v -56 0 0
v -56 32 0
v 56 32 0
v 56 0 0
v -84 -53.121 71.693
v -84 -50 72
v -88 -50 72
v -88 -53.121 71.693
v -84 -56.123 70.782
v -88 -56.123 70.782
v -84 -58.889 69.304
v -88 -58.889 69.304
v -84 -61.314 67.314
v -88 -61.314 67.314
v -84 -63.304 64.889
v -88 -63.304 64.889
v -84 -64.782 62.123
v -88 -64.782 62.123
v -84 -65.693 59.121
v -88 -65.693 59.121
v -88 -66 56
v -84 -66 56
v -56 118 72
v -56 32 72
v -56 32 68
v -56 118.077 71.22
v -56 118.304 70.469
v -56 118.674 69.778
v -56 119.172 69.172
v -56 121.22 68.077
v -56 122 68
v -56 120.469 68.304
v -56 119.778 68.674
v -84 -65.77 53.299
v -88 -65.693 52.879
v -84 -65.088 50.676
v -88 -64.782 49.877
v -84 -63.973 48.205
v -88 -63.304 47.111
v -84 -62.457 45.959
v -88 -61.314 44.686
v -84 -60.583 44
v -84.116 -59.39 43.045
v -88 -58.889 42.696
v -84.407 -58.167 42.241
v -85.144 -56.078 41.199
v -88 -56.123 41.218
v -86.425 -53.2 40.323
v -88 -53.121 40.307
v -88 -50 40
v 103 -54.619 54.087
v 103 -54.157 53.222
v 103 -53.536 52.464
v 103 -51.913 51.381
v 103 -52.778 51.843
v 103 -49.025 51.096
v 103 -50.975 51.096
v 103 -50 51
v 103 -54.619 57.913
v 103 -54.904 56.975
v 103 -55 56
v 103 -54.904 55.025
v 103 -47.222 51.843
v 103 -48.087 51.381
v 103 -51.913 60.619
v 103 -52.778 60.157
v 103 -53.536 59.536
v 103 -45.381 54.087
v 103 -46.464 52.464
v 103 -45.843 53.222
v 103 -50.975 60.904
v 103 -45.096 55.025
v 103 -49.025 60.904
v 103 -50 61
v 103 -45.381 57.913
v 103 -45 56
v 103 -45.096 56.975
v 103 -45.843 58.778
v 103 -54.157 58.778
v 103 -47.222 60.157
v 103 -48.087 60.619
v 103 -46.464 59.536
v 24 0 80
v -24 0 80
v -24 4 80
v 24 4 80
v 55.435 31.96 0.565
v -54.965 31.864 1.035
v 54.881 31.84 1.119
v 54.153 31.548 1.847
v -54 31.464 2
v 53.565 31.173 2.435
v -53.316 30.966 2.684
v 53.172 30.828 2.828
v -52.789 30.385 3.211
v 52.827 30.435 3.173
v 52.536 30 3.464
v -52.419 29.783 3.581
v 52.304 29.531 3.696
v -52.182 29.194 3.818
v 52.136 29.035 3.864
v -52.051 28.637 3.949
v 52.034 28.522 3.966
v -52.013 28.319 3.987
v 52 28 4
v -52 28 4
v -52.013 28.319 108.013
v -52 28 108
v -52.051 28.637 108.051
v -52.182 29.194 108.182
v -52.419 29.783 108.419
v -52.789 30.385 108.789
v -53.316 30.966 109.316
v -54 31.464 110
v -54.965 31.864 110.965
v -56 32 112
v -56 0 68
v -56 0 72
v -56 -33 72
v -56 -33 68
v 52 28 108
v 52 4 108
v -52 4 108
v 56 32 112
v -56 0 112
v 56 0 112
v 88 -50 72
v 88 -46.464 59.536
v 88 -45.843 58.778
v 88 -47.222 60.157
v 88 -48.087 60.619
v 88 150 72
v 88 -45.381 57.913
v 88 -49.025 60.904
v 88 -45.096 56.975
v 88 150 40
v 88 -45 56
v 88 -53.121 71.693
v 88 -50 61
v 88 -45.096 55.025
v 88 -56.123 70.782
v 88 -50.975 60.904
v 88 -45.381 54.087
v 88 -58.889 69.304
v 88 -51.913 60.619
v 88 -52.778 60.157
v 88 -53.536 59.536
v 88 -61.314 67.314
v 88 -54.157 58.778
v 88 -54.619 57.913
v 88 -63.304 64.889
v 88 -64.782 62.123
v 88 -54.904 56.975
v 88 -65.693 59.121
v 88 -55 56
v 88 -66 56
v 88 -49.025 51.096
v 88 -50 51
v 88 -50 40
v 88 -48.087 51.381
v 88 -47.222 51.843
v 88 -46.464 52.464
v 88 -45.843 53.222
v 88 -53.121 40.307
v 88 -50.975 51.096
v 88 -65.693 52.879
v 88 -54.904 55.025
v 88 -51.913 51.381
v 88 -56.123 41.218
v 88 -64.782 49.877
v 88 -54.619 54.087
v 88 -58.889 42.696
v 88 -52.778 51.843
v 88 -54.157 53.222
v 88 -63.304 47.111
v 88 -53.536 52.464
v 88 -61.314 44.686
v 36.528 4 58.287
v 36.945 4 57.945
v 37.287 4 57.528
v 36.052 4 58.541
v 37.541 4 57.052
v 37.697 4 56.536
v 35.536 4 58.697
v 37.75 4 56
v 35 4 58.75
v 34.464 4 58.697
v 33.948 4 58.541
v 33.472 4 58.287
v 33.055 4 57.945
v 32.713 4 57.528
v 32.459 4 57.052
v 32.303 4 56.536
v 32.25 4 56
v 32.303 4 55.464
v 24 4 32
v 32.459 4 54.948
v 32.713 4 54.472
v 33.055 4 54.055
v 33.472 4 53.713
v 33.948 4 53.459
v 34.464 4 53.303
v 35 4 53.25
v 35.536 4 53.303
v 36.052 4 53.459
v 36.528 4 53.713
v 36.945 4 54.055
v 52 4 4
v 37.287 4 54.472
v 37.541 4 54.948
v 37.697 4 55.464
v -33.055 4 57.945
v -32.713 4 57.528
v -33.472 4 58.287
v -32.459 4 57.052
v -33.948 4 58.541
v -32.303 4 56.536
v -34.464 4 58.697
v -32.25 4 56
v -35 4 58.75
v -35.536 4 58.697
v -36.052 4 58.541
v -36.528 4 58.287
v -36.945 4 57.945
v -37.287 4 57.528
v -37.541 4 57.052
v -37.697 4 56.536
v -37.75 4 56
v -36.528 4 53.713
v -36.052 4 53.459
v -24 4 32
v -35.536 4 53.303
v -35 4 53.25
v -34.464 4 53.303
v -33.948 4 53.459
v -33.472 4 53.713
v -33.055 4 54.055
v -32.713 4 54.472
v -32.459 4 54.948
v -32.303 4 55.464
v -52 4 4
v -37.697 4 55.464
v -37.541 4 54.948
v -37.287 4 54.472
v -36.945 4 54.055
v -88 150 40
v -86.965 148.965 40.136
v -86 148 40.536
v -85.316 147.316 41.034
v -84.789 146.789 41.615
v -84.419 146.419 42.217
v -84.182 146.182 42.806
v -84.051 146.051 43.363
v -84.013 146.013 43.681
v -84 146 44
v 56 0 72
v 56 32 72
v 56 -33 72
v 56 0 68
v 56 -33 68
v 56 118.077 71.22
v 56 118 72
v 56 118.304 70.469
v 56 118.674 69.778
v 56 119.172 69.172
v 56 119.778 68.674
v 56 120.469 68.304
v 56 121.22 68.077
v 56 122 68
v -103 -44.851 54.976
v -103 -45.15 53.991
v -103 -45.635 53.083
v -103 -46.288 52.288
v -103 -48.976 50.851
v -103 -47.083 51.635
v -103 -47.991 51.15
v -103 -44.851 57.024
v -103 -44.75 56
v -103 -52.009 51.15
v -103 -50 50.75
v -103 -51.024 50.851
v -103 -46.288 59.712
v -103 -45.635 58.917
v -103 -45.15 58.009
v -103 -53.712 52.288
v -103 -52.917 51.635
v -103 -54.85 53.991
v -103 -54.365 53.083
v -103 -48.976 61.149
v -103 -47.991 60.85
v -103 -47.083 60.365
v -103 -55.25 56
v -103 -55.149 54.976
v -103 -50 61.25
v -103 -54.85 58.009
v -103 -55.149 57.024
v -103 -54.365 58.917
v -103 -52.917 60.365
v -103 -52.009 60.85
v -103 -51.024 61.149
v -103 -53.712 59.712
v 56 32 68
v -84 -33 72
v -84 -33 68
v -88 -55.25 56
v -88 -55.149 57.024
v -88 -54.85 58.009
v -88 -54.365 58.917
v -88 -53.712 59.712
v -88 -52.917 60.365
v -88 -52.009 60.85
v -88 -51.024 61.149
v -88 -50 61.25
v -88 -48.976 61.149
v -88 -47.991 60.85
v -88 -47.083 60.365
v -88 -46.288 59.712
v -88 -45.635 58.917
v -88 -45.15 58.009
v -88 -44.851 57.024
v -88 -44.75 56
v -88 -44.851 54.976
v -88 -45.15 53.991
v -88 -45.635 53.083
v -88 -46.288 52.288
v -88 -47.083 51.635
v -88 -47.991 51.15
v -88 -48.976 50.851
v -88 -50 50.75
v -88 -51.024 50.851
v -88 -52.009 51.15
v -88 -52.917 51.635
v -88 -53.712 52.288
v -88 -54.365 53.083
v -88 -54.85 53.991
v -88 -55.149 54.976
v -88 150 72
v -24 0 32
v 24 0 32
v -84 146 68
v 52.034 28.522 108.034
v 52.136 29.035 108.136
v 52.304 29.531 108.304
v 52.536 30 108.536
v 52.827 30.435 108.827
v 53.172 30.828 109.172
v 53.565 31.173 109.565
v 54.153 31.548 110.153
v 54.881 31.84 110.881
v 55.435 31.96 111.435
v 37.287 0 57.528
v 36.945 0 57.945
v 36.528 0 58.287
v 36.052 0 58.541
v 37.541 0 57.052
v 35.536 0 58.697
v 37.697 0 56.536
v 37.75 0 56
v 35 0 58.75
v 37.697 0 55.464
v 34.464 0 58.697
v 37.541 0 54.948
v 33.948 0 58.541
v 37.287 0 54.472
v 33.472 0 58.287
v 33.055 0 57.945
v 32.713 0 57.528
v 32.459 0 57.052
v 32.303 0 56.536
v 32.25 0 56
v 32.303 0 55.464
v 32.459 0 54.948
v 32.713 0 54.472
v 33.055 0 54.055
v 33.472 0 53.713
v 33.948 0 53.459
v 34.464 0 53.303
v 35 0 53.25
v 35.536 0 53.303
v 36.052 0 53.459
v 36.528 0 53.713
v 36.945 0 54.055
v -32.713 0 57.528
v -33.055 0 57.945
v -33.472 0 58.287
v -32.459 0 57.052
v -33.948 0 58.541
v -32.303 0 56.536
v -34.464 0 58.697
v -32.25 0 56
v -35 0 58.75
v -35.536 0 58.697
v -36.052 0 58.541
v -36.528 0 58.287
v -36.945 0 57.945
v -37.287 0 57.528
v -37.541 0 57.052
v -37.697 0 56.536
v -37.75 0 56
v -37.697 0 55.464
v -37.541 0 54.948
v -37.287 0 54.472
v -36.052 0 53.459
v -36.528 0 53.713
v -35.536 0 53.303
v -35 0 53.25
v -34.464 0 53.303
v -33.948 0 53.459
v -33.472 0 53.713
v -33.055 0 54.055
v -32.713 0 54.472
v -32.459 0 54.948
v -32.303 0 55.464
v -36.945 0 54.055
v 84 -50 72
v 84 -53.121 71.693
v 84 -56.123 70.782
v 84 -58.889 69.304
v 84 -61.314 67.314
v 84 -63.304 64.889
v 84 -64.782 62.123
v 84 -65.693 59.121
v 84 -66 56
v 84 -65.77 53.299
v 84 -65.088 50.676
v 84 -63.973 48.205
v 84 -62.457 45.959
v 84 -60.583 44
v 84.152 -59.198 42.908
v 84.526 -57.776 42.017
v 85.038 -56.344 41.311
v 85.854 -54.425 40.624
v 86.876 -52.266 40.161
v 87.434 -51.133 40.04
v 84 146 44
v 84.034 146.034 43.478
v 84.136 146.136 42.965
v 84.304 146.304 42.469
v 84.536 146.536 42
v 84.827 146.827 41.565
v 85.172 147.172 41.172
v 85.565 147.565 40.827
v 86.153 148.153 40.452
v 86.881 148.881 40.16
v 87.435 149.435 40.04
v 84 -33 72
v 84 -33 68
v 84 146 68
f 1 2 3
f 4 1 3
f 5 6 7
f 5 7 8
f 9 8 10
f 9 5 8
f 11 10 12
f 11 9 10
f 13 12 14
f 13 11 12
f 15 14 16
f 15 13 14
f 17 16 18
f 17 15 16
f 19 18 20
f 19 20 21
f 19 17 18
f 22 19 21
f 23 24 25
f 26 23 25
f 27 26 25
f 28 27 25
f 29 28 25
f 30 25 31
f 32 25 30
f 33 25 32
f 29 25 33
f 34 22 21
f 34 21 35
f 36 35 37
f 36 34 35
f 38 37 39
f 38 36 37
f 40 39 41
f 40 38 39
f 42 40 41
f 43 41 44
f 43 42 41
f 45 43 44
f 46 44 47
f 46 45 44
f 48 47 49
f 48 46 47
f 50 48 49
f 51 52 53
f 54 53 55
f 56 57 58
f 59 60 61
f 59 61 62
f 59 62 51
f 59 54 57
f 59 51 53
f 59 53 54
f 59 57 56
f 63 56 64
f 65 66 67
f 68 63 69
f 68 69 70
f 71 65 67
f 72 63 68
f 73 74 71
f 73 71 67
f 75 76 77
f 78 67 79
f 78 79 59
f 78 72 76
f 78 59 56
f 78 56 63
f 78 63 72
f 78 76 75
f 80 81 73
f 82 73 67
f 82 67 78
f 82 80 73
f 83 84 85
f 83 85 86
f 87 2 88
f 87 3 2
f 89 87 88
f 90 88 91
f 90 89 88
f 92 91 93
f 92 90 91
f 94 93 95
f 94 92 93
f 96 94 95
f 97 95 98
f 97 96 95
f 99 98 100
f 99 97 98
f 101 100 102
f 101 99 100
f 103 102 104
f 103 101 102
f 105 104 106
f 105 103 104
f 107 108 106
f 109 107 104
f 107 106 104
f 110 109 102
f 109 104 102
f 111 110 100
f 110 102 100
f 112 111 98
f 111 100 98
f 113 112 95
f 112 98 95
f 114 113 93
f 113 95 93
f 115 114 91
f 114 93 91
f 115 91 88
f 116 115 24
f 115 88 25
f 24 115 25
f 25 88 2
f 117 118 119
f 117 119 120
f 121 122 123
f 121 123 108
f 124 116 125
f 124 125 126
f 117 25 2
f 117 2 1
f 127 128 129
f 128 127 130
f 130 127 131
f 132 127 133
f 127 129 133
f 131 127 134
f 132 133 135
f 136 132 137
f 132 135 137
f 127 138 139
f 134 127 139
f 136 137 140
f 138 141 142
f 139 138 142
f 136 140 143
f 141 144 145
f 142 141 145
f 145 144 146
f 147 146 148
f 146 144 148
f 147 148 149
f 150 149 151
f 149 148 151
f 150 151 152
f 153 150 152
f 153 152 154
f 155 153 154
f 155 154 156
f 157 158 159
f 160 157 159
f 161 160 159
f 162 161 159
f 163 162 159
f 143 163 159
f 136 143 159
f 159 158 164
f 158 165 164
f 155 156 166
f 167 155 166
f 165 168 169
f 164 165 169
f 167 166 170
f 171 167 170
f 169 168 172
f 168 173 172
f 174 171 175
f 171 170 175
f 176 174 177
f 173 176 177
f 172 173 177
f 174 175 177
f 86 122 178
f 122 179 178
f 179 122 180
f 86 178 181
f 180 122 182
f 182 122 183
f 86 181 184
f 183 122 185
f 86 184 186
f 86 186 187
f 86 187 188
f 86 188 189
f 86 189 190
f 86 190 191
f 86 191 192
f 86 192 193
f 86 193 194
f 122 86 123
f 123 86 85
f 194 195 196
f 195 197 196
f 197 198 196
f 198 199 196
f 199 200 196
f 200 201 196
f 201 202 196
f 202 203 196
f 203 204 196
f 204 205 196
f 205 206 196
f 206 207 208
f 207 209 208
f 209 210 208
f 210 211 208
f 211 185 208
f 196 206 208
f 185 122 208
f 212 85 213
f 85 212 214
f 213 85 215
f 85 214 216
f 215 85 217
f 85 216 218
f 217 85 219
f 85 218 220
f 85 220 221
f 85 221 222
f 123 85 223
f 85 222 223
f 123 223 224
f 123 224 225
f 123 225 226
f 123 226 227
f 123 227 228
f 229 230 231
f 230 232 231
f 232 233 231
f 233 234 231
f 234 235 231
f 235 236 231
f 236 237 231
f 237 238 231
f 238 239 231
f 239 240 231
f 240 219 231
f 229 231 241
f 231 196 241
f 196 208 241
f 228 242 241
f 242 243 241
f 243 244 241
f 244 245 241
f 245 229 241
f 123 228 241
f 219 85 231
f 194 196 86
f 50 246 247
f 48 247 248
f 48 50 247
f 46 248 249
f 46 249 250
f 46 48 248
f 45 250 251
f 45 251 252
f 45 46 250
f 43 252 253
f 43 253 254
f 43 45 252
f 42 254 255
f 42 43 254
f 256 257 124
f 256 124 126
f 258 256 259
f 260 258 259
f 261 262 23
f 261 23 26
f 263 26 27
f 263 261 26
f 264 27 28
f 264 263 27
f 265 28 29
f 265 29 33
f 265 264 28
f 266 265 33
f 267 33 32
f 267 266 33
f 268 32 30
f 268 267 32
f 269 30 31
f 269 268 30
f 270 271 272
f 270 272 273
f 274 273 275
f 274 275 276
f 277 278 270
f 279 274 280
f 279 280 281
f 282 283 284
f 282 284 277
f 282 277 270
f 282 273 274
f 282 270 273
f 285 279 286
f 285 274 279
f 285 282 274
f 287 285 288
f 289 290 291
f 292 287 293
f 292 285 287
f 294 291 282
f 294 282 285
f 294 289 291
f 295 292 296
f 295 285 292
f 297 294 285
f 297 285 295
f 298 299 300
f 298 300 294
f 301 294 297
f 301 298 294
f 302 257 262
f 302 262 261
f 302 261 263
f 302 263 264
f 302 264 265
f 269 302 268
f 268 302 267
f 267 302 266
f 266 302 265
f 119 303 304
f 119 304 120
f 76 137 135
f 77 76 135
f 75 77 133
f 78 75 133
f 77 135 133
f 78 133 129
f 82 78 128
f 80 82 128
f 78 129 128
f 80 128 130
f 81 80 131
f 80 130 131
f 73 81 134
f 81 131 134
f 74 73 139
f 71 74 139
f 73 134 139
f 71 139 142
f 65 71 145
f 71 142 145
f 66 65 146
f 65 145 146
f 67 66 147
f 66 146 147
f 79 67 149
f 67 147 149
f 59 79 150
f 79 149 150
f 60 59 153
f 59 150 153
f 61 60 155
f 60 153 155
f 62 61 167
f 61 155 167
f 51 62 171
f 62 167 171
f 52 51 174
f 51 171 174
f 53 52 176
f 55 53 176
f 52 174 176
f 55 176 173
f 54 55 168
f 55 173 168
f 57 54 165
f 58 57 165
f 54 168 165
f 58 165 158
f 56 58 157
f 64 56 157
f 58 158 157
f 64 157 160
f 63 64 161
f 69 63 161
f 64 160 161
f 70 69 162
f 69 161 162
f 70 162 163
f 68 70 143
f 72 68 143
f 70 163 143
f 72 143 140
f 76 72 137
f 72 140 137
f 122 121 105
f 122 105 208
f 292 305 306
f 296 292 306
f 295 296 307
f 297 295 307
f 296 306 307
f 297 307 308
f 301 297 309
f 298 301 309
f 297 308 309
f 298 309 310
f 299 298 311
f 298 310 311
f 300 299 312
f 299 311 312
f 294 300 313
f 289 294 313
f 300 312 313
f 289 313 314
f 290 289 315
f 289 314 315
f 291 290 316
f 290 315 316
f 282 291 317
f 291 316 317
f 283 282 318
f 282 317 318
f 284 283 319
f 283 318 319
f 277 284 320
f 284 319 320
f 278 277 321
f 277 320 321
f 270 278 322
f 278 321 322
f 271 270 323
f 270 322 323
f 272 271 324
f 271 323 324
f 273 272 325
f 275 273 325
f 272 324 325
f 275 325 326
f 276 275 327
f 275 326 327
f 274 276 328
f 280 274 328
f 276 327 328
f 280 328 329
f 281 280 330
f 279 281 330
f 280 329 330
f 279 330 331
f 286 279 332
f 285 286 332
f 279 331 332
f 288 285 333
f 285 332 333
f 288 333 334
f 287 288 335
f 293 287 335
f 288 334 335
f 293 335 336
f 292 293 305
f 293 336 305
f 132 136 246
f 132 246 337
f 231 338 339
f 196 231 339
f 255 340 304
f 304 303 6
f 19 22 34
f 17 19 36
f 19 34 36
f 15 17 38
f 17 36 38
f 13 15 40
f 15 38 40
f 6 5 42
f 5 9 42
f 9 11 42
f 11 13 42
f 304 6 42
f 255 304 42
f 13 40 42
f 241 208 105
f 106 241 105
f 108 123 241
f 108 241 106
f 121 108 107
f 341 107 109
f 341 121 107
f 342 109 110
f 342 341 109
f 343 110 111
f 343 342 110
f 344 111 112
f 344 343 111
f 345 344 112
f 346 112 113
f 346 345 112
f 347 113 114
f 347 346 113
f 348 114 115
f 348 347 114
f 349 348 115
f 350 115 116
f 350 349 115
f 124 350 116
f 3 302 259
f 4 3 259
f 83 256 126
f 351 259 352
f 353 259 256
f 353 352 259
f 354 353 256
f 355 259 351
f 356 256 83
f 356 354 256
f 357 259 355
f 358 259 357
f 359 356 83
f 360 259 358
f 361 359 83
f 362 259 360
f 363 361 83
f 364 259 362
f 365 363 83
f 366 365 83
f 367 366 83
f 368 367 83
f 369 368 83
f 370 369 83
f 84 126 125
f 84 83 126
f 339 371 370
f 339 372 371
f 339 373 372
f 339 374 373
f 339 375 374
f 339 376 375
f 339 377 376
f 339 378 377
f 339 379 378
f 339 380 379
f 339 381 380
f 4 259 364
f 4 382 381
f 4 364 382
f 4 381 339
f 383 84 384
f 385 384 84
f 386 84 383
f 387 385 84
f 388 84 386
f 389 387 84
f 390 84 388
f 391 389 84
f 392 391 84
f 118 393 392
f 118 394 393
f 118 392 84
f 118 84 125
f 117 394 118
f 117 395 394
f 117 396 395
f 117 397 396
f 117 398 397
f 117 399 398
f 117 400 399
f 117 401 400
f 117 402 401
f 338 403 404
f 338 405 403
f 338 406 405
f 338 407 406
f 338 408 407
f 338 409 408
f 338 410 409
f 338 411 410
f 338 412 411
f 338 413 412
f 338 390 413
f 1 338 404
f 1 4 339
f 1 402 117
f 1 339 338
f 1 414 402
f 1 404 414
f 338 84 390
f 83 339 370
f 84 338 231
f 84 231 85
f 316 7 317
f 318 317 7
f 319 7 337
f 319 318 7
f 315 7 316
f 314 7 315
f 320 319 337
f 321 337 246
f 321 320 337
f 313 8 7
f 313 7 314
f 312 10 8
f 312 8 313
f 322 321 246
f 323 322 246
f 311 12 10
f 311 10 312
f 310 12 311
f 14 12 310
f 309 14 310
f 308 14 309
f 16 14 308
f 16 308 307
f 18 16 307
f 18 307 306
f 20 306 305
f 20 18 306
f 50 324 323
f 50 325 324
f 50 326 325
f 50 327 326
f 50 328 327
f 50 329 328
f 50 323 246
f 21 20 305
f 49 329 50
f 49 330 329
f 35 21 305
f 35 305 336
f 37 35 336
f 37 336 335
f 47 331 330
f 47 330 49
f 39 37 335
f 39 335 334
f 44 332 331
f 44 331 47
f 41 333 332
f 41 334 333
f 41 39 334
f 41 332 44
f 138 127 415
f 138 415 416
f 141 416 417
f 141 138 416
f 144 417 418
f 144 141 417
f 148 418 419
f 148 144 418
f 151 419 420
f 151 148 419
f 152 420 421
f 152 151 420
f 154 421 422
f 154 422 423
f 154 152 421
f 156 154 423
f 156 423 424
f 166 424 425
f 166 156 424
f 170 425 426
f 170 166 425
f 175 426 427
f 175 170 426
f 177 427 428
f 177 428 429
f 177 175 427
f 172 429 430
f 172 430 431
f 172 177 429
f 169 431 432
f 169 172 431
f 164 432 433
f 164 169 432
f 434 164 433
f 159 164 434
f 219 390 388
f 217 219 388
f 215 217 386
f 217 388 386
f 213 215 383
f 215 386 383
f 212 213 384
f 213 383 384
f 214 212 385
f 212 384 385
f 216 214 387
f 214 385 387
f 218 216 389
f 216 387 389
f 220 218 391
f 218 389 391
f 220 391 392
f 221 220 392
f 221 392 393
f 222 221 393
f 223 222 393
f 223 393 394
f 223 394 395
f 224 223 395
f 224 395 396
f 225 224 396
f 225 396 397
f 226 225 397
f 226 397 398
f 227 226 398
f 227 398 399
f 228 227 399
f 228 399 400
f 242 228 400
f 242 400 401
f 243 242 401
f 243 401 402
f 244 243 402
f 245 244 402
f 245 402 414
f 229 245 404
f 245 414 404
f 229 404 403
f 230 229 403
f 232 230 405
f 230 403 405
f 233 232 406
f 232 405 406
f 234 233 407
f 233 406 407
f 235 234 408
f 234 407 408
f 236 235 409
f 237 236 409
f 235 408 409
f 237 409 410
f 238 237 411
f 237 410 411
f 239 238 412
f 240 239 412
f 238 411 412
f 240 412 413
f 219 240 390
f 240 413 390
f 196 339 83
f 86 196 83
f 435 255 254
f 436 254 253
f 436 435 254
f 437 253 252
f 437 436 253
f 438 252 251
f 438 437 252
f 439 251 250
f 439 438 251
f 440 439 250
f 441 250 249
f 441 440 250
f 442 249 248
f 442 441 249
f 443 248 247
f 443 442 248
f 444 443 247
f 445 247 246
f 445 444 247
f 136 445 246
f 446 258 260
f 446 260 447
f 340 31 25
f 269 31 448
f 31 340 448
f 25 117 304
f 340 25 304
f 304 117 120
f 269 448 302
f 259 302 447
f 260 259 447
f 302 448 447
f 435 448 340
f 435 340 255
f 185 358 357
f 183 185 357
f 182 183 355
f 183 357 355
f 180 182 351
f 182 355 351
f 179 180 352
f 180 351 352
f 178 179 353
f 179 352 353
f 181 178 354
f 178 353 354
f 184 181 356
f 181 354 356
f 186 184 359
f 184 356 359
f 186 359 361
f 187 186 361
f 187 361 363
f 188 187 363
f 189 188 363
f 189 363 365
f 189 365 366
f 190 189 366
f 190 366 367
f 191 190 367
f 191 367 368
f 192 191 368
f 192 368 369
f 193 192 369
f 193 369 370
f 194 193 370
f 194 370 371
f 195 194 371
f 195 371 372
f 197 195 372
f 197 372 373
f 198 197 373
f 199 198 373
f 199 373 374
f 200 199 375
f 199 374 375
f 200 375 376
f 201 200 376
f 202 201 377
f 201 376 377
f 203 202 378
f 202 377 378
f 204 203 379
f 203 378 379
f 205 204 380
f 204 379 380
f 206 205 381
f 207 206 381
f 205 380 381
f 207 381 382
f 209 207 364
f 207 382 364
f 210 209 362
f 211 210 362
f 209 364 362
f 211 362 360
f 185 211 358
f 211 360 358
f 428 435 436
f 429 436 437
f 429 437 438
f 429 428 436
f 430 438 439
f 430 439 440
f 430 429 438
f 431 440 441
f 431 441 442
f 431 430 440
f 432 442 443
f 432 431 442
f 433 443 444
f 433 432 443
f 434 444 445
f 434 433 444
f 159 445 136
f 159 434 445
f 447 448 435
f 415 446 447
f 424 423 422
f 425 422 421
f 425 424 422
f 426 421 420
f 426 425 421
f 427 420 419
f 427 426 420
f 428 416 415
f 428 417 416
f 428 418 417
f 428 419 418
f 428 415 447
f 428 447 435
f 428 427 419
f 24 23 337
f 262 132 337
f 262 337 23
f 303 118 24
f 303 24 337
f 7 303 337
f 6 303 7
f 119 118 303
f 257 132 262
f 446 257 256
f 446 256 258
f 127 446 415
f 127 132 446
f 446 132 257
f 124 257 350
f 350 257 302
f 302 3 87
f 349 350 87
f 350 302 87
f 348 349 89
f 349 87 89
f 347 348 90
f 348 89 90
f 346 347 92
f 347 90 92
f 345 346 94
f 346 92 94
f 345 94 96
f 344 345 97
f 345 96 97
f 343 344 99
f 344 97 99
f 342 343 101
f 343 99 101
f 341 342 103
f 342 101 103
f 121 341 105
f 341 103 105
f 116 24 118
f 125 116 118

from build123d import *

# Parameters (mm, degrees)
PAD_DEPTH         = 112
PAD001_DEPTH      = 112
SKETCH002_R       = 2.75
SKETCH002_W       = 48
SKETCH002_H       = 48
POCKET_DEPTH      = 32.001
PAD002_DEPTH      = 66
PAD002_DEPTH_BACK = 150
SKETCH004_W       = 28
SKETCH004_H       = 33
POCKET001_DEPTH   = 72.001
POCKET002_DEPTH   = 176.001
POCKET003_DEPTH   = 176.001
SKETCH007_R       = 5
PAD003_DEPTH      = 15
SKETCH008_R       = 5.25
PAD004_DEPTH      = 15
PAD005_DEPTH      = 176


with BuildPart() as part:
    # Sketch → Pad (new body)
    with BuildSketch(Plane.XY):
        with BuildLine():
            Line((-56, 32), (-56, 0))
            Line((56, 0), (-56, 0))
            Line((56, 32), (56, 0))
            ThreePointArc((56, 32), (53.171573, 30.828427), (52, 28))
            Line((52, 28), (52, 4))
            Line((52, 4), (-52, 4))
            Line((-52, 4), (-52, 28))
            ThreePointArc((-52, 28), (-53.171573, 30.828427), (-56, 32))
        make_face()
    extrude(amount=PAD_DEPTH)

    # Sketch001 (on Face8 of Pad) → Pad001 (join)
    with BuildSketch(Plane.YZ.offset(56)):
        with BuildLine():
            Line((0, 112), (32, 112))
            ThreePointArc((28, 108), (30.828427, 109.171573), (32, 112))
            Line((0, 108), (28, 108))
            Line((0, 108), (0, 112))
        make_face()
        with BuildLine():
            Line((0, 0), (32, 0))
            ThreePointArc((32, 0), (30.828427, 2.828427), (28, 4))
            Line((0, 4), (28, 4))
            Line((0, 0), (0, 4))
        make_face()
    extrude(amount=-PAD001_DEPTH)

    # Sketch002 (on Face13 of Pad001) → Pocket (cut, through all)
    with BuildSketch(Plane.XZ):
        with Locations((-35, 56)):
            Circle(SKETCH002_R)
        with Locations((35, 56)):
            Circle(SKETCH002_R)
        with Locations((0, 56)):
            Rectangle(SKETCH002_W, SKETCH002_H)
    extrude(amount=-POCKET_DEPTH, mode=Mode.SUBTRACT)

    # Sketch003 (on Face13 of Pocket) → Pad002 (join, two sides)
    with BuildSketch(Plane.XZ) as pad002_sk:
        with BuildLine():
            Line((56, 72), (56, 68))
            Line((56, 68), (84, 68))
            Line((84, 68), (84, 44))
            ThreePointArc((84, 44), (85.171573, 41.171573), (88, 40))
            Line((88, 72), (88, 40))
            Line((56, 72), (88, 72))
        make_face()
        with BuildLine():
            Line((-56, 72), (-56, 68))
            Line((-56, 68), (-84, 68))
            Line((-84, 68), (-84, 44))
            ThreePointArc((-88, 40), (-85.171573, 41.171573), (-84, 44))
            Line((-88, 72), (-88, 40))
            Line((-56, 72), (-88, 72))
        make_face()
    extrude(amount=PAD002_DEPTH)
    extrude(pad002_sk.sketch, amount=-PAD002_DEPTH_BACK)

    # Sketch004 (on Face18 of Pad002) → Pocket001 (cut, through all)
    with BuildSketch(Plane.XY.offset(72)):
        with Locations((70, -49.5)):
            Rectangle(SKETCH004_W, SKETCH004_H)
        with Locations((-70, -49.5)):
            Rectangle(SKETCH004_W, SKETCH004_H)
    extrude(amount=-POCKET001_DEPTH, mode=Mode.SUBTRACT)

    # Sketch005 (on Face39 of Pocket001) → Pocket002 (cut, through all)
    with BuildSketch(Plane.YZ.offset(88)):
        with BuildLine():
            Line((-66, 72), (-50, 72))
            ThreePointArc((-50, 72), (-61.313708, 67.313708), (-66, 56))
            Line((-66, 72), (-66, 56))
        make_face()
    extrude(amount=-POCKET002_DEPTH, mode=Mode.SUBTRACT)

    # Sketch006 (on Face39 of Pocket002) → Pocket003 (cut, through all)
    with BuildSketch(Plane.YZ.offset(88)):
        with BuildLine():
            Line((-50, 40), (-66, 40))
            Line((-66, 40), (-66, 56))
            ThreePointArc((-66, 56), (-61.313708, 44.686292), (-50, 40))
        make_face()
    extrude(amount=-POCKET003_DEPTH, mode=Mode.SUBTRACT)

    # Sketch007 (on Face39 of Pocket003) → Pad003 (join)
    with BuildSketch(Plane.YZ.offset(88)):
        with Locations((-50, 56)):
            Circle(SKETCH007_R)
    extrude(amount=PAD003_DEPTH)

    # Sketch008 (on Face53 of Pad003) → Pad004 (join)
    with BuildSketch(Plane(origin=(-88, 0, 0), x_dir=(0, -1, 0), z_dir=(-1, 0, 0))):
        with Locations((50, 56)):
            Circle(SKETCH008_R)
    extrude(amount=PAD004_DEPTH)

    # Sketch009 (on Face39 of Pad004) → Pad005 (join)
    with BuildSketch(Plane.YZ.offset(88)):
        with BuildLine():
            Line((150, 40), (150, 72))
            Line((150, 72), (118, 72))
            ThreePointArc((118, 72), (119.171573, 69.171573), (122, 68))
            Line((146, 68), (122, 68))
            Line((146, 68), (146, 44))
            ThreePointArc((146, 44), (147.171573, 41.171573), (150, 40))
        make_face()
    extrude(amount=-PAD005_DEPTH)


solid = part.part
